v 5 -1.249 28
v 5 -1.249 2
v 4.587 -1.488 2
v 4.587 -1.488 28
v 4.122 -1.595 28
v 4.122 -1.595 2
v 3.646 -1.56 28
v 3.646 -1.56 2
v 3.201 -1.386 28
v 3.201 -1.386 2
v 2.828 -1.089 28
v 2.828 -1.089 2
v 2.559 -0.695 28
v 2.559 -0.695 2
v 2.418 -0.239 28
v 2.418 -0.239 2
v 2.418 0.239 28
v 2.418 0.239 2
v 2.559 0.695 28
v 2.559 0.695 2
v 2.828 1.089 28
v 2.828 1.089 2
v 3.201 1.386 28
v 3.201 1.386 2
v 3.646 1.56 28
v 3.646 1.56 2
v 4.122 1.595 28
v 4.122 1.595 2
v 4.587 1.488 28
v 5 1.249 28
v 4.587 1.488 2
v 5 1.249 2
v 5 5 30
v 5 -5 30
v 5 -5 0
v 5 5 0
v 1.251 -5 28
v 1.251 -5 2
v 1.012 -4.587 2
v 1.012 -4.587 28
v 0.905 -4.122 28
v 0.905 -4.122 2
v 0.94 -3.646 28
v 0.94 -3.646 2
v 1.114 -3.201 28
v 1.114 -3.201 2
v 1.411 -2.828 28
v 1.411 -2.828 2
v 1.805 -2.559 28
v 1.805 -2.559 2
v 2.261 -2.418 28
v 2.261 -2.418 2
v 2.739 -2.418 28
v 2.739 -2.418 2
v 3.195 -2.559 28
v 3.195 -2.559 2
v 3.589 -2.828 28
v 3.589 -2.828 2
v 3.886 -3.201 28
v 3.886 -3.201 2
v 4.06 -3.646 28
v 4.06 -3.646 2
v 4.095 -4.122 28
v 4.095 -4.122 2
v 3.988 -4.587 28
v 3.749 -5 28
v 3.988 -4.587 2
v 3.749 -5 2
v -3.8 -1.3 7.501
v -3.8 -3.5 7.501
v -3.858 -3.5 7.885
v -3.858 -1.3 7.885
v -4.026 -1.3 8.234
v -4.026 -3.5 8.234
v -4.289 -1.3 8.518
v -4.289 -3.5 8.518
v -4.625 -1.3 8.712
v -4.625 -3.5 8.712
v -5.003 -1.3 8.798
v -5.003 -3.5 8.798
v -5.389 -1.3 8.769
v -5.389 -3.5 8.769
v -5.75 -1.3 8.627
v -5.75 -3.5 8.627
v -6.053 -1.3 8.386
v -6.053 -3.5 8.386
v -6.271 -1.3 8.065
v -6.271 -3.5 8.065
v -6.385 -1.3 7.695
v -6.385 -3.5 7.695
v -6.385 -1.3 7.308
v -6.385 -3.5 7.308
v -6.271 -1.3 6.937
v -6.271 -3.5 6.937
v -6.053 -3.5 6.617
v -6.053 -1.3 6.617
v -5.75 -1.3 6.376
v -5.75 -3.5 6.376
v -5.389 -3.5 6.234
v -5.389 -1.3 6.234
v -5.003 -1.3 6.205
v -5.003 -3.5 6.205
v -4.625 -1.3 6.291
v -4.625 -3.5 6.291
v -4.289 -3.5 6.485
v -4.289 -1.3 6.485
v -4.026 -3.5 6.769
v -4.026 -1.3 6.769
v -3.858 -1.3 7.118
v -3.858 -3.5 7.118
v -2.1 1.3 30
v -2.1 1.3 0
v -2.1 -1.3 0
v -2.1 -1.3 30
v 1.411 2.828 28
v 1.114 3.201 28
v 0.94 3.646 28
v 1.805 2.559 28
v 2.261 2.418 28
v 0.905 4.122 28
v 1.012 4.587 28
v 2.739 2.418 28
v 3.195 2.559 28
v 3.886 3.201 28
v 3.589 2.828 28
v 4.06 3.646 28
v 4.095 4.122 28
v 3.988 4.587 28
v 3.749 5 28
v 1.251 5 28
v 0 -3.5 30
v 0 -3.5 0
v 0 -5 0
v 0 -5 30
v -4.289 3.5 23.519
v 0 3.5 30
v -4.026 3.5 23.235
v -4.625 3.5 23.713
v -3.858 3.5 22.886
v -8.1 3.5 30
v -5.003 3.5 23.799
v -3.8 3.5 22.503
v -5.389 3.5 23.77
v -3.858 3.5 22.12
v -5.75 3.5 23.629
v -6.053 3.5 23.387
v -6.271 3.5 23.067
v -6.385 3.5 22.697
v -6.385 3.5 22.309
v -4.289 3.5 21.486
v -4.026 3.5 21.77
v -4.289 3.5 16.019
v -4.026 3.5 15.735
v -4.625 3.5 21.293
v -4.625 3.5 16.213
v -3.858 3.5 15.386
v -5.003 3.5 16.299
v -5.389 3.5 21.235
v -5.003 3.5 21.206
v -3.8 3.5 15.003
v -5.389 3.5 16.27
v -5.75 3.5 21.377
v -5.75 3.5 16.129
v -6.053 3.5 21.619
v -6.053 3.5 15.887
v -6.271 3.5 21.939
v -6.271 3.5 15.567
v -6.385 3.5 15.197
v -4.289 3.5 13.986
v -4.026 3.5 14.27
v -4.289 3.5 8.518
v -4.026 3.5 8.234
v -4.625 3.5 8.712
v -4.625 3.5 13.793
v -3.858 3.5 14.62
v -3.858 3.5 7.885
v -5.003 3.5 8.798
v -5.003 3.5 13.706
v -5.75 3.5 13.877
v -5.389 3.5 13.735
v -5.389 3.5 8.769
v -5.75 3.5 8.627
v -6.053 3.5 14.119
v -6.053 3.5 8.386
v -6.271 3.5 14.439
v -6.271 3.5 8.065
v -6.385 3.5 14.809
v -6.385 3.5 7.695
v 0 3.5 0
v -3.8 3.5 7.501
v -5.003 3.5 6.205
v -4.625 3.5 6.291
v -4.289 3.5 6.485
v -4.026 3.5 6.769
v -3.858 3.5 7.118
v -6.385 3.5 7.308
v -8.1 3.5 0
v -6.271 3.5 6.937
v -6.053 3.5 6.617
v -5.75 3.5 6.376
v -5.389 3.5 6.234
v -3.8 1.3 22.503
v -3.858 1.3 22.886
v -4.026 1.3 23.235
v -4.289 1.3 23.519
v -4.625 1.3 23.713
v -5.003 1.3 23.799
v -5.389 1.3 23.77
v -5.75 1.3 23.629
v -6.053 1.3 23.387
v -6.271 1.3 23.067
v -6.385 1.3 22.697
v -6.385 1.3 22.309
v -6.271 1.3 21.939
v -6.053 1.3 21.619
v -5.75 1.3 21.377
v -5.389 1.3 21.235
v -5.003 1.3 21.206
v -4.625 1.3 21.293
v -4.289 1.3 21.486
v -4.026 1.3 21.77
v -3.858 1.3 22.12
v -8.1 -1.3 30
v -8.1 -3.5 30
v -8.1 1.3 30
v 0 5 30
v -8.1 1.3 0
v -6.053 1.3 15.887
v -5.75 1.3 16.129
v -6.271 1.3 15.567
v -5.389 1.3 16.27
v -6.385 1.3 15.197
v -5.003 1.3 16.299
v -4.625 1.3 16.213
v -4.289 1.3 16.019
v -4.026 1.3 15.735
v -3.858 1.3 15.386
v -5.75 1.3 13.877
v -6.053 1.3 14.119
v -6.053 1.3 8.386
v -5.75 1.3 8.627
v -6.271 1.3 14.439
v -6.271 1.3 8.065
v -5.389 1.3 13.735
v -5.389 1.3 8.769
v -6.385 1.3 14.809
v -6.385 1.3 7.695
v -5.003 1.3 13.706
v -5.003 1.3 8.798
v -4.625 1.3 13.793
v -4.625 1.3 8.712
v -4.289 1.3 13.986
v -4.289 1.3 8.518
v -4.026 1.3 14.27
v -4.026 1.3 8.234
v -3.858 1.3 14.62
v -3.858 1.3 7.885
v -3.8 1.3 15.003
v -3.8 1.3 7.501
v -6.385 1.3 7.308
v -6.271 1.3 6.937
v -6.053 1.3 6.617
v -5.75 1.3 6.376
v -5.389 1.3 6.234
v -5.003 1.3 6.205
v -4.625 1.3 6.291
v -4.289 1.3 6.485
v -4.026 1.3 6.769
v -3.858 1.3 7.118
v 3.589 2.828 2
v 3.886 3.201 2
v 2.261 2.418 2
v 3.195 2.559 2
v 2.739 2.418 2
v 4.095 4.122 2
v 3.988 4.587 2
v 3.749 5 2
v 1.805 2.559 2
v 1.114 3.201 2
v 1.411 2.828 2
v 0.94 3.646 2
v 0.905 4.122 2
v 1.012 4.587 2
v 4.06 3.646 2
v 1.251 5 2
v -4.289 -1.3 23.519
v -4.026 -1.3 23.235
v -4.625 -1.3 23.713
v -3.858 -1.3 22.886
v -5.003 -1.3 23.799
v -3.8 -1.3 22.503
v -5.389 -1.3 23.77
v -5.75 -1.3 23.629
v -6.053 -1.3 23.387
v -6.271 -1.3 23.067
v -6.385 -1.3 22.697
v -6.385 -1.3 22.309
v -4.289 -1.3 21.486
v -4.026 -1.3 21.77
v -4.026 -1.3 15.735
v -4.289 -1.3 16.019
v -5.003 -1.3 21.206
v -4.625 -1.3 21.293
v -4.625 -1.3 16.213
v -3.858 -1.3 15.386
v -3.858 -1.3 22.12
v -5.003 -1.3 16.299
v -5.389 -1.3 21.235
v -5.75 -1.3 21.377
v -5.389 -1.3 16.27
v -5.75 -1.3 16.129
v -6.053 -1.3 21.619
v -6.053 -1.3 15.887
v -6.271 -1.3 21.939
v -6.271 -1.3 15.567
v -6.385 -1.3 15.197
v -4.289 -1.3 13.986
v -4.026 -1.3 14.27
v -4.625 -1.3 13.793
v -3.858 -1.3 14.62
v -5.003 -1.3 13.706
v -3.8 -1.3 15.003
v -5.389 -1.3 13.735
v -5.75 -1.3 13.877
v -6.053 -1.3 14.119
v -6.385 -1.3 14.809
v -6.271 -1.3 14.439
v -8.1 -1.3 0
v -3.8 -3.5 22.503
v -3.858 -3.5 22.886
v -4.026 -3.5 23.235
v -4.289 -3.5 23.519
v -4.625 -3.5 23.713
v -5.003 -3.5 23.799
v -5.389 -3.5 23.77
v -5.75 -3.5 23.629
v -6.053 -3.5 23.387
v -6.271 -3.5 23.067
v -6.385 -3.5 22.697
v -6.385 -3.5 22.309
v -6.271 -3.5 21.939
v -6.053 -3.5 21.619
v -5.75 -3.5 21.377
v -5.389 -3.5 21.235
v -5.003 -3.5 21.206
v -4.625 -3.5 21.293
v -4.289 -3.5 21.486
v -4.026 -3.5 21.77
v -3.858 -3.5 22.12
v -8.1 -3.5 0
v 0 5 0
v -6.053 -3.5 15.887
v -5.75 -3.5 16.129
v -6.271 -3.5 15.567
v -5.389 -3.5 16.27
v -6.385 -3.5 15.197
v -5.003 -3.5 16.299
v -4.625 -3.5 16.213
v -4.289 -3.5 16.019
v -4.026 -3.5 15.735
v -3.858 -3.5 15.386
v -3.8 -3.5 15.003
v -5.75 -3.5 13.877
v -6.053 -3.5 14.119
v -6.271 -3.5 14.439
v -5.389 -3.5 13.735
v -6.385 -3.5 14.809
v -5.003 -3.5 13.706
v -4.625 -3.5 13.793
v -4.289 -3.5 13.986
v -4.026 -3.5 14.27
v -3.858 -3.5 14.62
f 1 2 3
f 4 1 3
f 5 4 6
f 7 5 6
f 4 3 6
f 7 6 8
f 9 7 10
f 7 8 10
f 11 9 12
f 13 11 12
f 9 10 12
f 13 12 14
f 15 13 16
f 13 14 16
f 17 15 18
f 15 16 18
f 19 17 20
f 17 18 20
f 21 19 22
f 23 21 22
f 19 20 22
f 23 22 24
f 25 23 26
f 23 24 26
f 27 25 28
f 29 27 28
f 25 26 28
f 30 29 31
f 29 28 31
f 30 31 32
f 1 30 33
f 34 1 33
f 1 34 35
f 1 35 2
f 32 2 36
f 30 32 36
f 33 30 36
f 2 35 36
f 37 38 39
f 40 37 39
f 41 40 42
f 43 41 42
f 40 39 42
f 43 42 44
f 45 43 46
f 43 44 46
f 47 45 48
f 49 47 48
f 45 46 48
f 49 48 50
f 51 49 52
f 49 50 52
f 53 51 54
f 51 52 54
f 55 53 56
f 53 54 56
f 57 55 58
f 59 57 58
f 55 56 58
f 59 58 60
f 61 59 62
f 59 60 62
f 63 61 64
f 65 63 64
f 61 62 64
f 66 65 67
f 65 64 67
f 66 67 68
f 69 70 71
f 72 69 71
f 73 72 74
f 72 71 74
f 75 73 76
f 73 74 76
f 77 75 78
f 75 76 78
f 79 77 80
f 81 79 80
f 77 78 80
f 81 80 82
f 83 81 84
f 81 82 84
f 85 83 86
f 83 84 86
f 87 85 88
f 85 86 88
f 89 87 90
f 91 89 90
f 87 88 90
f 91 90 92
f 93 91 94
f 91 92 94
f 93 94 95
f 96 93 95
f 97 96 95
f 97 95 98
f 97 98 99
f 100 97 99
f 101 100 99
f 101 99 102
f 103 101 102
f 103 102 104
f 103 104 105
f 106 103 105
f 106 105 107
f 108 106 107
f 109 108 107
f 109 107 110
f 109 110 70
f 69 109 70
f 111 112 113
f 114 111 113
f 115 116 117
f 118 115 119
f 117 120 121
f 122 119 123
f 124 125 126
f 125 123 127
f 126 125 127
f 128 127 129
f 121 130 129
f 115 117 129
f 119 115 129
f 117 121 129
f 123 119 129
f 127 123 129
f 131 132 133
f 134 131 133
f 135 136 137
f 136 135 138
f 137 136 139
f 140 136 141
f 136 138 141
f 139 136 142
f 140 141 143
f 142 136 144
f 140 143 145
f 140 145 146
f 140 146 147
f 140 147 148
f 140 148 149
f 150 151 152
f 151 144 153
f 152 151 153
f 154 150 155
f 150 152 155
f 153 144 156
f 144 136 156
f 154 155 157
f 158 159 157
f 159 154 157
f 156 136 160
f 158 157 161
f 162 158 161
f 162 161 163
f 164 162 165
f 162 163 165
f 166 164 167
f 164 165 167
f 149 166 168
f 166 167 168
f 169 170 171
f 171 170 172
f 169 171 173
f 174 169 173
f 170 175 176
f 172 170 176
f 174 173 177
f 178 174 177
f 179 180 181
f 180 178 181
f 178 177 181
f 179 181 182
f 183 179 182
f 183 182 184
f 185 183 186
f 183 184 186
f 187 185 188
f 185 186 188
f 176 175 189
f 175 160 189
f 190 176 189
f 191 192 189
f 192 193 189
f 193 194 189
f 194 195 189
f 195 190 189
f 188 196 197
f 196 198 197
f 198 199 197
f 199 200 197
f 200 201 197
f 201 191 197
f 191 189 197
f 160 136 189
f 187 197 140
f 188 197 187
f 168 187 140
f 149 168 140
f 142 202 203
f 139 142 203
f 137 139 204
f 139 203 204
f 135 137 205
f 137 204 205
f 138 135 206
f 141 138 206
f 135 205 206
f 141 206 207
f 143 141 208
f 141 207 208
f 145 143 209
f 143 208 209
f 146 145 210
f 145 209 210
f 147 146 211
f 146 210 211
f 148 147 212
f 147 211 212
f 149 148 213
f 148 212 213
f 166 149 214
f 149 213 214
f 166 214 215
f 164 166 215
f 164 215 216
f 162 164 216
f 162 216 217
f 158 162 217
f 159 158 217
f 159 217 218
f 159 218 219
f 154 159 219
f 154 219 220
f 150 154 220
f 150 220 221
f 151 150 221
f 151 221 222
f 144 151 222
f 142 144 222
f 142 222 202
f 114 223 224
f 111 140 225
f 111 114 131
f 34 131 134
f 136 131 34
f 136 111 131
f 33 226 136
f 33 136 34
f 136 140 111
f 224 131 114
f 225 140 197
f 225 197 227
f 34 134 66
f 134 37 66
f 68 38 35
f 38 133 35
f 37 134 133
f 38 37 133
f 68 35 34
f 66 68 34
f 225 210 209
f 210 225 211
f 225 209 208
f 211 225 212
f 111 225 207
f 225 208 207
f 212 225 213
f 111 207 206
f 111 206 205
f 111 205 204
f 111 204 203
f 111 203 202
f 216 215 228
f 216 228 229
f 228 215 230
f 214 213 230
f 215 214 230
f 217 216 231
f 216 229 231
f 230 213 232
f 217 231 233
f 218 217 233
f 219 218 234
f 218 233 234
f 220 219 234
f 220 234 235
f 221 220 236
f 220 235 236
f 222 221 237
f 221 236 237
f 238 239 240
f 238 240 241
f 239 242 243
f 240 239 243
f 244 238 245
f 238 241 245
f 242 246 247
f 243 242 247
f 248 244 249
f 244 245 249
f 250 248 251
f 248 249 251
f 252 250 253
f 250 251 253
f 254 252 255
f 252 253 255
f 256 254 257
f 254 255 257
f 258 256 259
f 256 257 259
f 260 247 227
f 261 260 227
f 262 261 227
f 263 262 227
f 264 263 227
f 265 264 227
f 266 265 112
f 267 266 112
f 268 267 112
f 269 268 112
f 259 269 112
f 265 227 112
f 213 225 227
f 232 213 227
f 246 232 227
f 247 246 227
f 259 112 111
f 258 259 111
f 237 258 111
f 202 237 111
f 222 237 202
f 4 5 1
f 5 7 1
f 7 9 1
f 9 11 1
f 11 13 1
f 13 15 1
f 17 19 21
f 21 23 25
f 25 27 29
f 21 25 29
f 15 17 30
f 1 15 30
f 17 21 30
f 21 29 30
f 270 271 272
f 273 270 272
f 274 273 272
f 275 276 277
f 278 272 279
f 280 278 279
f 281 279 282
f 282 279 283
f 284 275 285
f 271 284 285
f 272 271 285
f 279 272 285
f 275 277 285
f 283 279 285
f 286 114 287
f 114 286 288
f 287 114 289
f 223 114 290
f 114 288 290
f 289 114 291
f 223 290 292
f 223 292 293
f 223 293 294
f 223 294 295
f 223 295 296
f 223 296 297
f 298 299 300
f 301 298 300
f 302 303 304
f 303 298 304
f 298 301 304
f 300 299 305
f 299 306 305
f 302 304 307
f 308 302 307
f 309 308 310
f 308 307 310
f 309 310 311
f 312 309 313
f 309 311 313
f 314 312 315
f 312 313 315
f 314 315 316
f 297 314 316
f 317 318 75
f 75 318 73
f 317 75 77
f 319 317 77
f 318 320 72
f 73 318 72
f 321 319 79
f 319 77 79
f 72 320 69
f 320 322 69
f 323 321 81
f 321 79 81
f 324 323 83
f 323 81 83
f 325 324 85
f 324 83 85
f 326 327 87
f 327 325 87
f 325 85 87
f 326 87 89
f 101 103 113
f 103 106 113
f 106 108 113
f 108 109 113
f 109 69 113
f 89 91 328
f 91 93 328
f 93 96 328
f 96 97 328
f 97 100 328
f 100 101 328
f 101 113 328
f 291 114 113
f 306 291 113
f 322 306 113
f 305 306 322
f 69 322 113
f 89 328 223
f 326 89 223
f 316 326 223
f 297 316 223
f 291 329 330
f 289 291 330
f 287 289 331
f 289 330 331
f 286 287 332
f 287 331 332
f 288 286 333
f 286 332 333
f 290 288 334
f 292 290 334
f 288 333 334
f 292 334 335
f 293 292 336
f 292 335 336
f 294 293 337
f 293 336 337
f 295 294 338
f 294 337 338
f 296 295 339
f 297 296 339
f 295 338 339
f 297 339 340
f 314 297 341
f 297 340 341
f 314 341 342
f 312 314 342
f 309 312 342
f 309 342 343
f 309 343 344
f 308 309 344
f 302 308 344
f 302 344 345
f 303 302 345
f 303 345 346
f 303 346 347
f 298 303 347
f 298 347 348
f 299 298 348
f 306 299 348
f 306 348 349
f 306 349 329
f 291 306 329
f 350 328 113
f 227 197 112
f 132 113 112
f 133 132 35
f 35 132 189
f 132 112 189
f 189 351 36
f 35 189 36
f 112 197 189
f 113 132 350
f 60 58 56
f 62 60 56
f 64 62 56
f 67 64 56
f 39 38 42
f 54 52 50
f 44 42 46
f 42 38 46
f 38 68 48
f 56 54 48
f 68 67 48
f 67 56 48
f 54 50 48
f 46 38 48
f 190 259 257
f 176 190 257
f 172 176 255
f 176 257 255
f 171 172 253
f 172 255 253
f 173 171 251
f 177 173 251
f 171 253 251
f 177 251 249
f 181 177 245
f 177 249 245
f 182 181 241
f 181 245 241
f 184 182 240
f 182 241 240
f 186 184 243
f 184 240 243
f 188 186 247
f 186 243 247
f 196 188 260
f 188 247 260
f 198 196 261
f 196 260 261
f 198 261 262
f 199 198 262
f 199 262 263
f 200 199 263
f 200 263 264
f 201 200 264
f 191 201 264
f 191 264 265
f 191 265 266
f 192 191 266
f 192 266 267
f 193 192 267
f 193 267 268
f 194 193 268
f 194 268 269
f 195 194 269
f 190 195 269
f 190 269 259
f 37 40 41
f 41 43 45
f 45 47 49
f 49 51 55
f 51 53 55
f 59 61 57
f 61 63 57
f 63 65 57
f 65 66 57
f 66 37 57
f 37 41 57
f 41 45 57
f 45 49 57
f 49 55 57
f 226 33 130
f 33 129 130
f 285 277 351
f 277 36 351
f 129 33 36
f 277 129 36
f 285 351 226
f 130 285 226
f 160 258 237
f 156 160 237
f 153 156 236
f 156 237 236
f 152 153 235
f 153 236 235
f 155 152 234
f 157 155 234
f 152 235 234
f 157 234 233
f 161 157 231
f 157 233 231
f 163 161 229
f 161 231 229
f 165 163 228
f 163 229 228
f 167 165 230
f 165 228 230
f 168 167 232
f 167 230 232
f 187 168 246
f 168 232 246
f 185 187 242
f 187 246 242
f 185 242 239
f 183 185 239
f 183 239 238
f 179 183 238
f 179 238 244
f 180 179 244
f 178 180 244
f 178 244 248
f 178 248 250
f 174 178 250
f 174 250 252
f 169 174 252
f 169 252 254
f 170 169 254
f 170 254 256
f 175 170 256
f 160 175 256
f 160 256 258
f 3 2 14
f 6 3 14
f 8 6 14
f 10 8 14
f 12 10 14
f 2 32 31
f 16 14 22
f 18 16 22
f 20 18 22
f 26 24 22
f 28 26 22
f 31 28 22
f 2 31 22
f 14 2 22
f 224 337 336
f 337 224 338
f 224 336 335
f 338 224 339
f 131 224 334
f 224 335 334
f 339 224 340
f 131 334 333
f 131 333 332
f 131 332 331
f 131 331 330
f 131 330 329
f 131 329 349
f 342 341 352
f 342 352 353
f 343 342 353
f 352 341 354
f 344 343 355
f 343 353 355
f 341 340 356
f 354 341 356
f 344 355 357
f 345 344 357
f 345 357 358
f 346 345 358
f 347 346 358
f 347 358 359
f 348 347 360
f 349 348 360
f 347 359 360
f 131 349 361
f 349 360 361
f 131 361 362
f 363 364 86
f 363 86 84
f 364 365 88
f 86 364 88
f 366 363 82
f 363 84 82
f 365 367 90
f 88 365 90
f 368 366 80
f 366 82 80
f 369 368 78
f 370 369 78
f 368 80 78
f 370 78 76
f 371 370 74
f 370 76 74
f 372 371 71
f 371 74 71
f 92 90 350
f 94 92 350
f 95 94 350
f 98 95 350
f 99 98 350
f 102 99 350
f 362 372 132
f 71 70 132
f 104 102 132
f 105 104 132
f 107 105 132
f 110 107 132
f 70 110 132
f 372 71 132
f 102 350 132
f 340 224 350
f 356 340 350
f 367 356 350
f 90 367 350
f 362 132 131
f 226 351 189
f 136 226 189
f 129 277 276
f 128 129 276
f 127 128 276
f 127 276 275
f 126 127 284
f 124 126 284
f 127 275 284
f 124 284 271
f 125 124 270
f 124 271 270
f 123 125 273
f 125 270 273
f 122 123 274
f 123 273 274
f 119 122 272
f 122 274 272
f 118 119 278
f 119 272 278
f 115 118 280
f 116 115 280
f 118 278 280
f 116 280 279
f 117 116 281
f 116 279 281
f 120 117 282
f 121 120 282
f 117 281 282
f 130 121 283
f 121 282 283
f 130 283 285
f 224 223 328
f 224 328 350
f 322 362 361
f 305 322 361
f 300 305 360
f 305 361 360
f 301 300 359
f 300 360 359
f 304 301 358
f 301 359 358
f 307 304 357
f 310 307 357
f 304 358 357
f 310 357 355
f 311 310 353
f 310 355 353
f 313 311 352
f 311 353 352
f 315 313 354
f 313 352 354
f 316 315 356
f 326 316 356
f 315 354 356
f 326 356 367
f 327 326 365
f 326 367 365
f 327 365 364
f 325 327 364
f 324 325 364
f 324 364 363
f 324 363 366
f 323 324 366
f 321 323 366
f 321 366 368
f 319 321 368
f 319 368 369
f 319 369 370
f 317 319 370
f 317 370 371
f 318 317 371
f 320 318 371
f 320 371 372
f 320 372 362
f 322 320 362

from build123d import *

# Parameters (mm, degrees)
EXTRUDE_1_DEPTH     = 30
SKETCH_2_R          = 1.3
CUT_EXTRUDE_1_DEPTH = 30
SKETCH_3_W          = 5
SKETCH_3_H          = 10
EXTRUDE_2_DEPTH     = 2
EXTRUDE_3_DEPTH     = 2


with BuildPart() as part:
    # 草图1 → 凸台-拉伸1 (new body)
    with BuildSketch(Plane.XY):
        with BuildLine():
            Line((0, 3.5), (-2.1, 3.5))
            Line((-2.1, 3.5), (-8.1, 3.5))
            Line((-8.1, 3.5), (-8.1, 1.3))
            Line((-8.1, 1.3), (-2.1, 1.3))
            Line((-2.1, 1.3), (-2.1, -1.3))
            Line((-2.1, -1.3), (-8.1, -1.3))
            Line((-8.1, -1.3), (-8.1, -3.5))
            Line((-8.1, -3.5), (-2.1, -3.5))
            Line((-2.1, -3.5), (0, -3.5))
            Line((0, -3.5), (0, -5))
            Line((0, -5), (1.2510004, -5))
            ThreePointArc((1.2510004, -5), (2.5, -2.4), (3.7489996, -5))
            Line((3.7489996, -5), (5, -5))
            Line((5, -5), (5, -1.2489996))
            ThreePointArc((5, -1.2489996), (2.4, 0), (5, 1.2489996))
            Line((5, 1.2489996), (5, 5))
            Line((5, 5), (3.7489996, 5))
            ThreePointArc((3.7489996, 5), (2.5, 2.4), (1.2510004, 5))
            Line((1.2510004, 5), (0, 5))
            Line((0, 5), (0, 3.5))
        make_face()
    extrude(amount=EXTRUDE_1_DEPTH)

    # 草图2 → 切除-拉伸1 (cut)
    with BuildSketch(Plane.XZ.offset(3.5)):
        with Locations((-5.099947381, 15.002748372)):
            Circle(SKETCH_2_R)
        with Locations((-5.099947381, 7.501374186)):
            Circle(SKETCH_2_R)
        with Locations((-5.099947381, 22.502748372)):
            Circle(SKETCH_2_R)
    extrude(amount=-CUT_EXTRUDE_1_DEPTH, mode=Mode.SUBTRACT)

    # 草图3 → 凸台-拉伸2 (add)
    with BuildSketch(Plane.XY.offset(30)):
        with Locations((2.5, 0)):
            Rectangle(SKETCH_3_W, SKETCH_3_H)
    extrude(amount=-EXTRUDE_2_DEPTH)

    # 草图4 → 凸台-拉伸3 (add)
    with BuildSketch(Plane(origin=(0, 0, 0), x_dir=(-1, 0, 0), z_dir=(0, 0, -1))):
        with BuildLine():
            Line((0, 3.5), (0, 5))
            Line((0, 5), (-1.2510004, 5))
            ThreePointArc((-1.2510004, 5), (-2.5, 2.4), (-3.7489996, 5))
            Line((-3.7489996, 5), (-5, 5))
            Line((-5, 5), (-5, 1.2489996))
            ThreePointArc((-5, 1.2489996), (-2.4, 0), (-5, -1.2489996))
            Line((-5, -1.2489996), (-5, -5))
            Line((-5, -5), (-3.7489996, -5))
            ThreePointArc((-3.7489996, -5), (-2.5, -2.4), (-1.2510004, -5))
            Line((-1.2510004, -5), (0, -5))
            Line((0, -5), (0, -3.5))
            Line((0, -3.5), (0, 3.5))
        make_face()
        with BuildLine():
            Line((-1.2510004, 5), (-3.7489996, 5))
            ThreePointArc((-3.7489996, 5), (-2.5, 2.4), (-1.2510004, 5))
        make_face()
        with BuildLine():
            ThreePointArc((-5, -1.2489996), (-2.4, 0), (-5, 1.2489996))
            Line((-5, 1.2489996), (-5, -1.2489996))
        make_face()
        with BuildLine():
            Line((-3.7489996, -5), (-1.2510004, -5))
            ThreePointArc((-1.2510004, -5), (-2.5, -2.4), (-3.7489996, -5))
        make_face()
    extrude(amount=-EXTRUDE_3_DEPTH)


solid = part.part
